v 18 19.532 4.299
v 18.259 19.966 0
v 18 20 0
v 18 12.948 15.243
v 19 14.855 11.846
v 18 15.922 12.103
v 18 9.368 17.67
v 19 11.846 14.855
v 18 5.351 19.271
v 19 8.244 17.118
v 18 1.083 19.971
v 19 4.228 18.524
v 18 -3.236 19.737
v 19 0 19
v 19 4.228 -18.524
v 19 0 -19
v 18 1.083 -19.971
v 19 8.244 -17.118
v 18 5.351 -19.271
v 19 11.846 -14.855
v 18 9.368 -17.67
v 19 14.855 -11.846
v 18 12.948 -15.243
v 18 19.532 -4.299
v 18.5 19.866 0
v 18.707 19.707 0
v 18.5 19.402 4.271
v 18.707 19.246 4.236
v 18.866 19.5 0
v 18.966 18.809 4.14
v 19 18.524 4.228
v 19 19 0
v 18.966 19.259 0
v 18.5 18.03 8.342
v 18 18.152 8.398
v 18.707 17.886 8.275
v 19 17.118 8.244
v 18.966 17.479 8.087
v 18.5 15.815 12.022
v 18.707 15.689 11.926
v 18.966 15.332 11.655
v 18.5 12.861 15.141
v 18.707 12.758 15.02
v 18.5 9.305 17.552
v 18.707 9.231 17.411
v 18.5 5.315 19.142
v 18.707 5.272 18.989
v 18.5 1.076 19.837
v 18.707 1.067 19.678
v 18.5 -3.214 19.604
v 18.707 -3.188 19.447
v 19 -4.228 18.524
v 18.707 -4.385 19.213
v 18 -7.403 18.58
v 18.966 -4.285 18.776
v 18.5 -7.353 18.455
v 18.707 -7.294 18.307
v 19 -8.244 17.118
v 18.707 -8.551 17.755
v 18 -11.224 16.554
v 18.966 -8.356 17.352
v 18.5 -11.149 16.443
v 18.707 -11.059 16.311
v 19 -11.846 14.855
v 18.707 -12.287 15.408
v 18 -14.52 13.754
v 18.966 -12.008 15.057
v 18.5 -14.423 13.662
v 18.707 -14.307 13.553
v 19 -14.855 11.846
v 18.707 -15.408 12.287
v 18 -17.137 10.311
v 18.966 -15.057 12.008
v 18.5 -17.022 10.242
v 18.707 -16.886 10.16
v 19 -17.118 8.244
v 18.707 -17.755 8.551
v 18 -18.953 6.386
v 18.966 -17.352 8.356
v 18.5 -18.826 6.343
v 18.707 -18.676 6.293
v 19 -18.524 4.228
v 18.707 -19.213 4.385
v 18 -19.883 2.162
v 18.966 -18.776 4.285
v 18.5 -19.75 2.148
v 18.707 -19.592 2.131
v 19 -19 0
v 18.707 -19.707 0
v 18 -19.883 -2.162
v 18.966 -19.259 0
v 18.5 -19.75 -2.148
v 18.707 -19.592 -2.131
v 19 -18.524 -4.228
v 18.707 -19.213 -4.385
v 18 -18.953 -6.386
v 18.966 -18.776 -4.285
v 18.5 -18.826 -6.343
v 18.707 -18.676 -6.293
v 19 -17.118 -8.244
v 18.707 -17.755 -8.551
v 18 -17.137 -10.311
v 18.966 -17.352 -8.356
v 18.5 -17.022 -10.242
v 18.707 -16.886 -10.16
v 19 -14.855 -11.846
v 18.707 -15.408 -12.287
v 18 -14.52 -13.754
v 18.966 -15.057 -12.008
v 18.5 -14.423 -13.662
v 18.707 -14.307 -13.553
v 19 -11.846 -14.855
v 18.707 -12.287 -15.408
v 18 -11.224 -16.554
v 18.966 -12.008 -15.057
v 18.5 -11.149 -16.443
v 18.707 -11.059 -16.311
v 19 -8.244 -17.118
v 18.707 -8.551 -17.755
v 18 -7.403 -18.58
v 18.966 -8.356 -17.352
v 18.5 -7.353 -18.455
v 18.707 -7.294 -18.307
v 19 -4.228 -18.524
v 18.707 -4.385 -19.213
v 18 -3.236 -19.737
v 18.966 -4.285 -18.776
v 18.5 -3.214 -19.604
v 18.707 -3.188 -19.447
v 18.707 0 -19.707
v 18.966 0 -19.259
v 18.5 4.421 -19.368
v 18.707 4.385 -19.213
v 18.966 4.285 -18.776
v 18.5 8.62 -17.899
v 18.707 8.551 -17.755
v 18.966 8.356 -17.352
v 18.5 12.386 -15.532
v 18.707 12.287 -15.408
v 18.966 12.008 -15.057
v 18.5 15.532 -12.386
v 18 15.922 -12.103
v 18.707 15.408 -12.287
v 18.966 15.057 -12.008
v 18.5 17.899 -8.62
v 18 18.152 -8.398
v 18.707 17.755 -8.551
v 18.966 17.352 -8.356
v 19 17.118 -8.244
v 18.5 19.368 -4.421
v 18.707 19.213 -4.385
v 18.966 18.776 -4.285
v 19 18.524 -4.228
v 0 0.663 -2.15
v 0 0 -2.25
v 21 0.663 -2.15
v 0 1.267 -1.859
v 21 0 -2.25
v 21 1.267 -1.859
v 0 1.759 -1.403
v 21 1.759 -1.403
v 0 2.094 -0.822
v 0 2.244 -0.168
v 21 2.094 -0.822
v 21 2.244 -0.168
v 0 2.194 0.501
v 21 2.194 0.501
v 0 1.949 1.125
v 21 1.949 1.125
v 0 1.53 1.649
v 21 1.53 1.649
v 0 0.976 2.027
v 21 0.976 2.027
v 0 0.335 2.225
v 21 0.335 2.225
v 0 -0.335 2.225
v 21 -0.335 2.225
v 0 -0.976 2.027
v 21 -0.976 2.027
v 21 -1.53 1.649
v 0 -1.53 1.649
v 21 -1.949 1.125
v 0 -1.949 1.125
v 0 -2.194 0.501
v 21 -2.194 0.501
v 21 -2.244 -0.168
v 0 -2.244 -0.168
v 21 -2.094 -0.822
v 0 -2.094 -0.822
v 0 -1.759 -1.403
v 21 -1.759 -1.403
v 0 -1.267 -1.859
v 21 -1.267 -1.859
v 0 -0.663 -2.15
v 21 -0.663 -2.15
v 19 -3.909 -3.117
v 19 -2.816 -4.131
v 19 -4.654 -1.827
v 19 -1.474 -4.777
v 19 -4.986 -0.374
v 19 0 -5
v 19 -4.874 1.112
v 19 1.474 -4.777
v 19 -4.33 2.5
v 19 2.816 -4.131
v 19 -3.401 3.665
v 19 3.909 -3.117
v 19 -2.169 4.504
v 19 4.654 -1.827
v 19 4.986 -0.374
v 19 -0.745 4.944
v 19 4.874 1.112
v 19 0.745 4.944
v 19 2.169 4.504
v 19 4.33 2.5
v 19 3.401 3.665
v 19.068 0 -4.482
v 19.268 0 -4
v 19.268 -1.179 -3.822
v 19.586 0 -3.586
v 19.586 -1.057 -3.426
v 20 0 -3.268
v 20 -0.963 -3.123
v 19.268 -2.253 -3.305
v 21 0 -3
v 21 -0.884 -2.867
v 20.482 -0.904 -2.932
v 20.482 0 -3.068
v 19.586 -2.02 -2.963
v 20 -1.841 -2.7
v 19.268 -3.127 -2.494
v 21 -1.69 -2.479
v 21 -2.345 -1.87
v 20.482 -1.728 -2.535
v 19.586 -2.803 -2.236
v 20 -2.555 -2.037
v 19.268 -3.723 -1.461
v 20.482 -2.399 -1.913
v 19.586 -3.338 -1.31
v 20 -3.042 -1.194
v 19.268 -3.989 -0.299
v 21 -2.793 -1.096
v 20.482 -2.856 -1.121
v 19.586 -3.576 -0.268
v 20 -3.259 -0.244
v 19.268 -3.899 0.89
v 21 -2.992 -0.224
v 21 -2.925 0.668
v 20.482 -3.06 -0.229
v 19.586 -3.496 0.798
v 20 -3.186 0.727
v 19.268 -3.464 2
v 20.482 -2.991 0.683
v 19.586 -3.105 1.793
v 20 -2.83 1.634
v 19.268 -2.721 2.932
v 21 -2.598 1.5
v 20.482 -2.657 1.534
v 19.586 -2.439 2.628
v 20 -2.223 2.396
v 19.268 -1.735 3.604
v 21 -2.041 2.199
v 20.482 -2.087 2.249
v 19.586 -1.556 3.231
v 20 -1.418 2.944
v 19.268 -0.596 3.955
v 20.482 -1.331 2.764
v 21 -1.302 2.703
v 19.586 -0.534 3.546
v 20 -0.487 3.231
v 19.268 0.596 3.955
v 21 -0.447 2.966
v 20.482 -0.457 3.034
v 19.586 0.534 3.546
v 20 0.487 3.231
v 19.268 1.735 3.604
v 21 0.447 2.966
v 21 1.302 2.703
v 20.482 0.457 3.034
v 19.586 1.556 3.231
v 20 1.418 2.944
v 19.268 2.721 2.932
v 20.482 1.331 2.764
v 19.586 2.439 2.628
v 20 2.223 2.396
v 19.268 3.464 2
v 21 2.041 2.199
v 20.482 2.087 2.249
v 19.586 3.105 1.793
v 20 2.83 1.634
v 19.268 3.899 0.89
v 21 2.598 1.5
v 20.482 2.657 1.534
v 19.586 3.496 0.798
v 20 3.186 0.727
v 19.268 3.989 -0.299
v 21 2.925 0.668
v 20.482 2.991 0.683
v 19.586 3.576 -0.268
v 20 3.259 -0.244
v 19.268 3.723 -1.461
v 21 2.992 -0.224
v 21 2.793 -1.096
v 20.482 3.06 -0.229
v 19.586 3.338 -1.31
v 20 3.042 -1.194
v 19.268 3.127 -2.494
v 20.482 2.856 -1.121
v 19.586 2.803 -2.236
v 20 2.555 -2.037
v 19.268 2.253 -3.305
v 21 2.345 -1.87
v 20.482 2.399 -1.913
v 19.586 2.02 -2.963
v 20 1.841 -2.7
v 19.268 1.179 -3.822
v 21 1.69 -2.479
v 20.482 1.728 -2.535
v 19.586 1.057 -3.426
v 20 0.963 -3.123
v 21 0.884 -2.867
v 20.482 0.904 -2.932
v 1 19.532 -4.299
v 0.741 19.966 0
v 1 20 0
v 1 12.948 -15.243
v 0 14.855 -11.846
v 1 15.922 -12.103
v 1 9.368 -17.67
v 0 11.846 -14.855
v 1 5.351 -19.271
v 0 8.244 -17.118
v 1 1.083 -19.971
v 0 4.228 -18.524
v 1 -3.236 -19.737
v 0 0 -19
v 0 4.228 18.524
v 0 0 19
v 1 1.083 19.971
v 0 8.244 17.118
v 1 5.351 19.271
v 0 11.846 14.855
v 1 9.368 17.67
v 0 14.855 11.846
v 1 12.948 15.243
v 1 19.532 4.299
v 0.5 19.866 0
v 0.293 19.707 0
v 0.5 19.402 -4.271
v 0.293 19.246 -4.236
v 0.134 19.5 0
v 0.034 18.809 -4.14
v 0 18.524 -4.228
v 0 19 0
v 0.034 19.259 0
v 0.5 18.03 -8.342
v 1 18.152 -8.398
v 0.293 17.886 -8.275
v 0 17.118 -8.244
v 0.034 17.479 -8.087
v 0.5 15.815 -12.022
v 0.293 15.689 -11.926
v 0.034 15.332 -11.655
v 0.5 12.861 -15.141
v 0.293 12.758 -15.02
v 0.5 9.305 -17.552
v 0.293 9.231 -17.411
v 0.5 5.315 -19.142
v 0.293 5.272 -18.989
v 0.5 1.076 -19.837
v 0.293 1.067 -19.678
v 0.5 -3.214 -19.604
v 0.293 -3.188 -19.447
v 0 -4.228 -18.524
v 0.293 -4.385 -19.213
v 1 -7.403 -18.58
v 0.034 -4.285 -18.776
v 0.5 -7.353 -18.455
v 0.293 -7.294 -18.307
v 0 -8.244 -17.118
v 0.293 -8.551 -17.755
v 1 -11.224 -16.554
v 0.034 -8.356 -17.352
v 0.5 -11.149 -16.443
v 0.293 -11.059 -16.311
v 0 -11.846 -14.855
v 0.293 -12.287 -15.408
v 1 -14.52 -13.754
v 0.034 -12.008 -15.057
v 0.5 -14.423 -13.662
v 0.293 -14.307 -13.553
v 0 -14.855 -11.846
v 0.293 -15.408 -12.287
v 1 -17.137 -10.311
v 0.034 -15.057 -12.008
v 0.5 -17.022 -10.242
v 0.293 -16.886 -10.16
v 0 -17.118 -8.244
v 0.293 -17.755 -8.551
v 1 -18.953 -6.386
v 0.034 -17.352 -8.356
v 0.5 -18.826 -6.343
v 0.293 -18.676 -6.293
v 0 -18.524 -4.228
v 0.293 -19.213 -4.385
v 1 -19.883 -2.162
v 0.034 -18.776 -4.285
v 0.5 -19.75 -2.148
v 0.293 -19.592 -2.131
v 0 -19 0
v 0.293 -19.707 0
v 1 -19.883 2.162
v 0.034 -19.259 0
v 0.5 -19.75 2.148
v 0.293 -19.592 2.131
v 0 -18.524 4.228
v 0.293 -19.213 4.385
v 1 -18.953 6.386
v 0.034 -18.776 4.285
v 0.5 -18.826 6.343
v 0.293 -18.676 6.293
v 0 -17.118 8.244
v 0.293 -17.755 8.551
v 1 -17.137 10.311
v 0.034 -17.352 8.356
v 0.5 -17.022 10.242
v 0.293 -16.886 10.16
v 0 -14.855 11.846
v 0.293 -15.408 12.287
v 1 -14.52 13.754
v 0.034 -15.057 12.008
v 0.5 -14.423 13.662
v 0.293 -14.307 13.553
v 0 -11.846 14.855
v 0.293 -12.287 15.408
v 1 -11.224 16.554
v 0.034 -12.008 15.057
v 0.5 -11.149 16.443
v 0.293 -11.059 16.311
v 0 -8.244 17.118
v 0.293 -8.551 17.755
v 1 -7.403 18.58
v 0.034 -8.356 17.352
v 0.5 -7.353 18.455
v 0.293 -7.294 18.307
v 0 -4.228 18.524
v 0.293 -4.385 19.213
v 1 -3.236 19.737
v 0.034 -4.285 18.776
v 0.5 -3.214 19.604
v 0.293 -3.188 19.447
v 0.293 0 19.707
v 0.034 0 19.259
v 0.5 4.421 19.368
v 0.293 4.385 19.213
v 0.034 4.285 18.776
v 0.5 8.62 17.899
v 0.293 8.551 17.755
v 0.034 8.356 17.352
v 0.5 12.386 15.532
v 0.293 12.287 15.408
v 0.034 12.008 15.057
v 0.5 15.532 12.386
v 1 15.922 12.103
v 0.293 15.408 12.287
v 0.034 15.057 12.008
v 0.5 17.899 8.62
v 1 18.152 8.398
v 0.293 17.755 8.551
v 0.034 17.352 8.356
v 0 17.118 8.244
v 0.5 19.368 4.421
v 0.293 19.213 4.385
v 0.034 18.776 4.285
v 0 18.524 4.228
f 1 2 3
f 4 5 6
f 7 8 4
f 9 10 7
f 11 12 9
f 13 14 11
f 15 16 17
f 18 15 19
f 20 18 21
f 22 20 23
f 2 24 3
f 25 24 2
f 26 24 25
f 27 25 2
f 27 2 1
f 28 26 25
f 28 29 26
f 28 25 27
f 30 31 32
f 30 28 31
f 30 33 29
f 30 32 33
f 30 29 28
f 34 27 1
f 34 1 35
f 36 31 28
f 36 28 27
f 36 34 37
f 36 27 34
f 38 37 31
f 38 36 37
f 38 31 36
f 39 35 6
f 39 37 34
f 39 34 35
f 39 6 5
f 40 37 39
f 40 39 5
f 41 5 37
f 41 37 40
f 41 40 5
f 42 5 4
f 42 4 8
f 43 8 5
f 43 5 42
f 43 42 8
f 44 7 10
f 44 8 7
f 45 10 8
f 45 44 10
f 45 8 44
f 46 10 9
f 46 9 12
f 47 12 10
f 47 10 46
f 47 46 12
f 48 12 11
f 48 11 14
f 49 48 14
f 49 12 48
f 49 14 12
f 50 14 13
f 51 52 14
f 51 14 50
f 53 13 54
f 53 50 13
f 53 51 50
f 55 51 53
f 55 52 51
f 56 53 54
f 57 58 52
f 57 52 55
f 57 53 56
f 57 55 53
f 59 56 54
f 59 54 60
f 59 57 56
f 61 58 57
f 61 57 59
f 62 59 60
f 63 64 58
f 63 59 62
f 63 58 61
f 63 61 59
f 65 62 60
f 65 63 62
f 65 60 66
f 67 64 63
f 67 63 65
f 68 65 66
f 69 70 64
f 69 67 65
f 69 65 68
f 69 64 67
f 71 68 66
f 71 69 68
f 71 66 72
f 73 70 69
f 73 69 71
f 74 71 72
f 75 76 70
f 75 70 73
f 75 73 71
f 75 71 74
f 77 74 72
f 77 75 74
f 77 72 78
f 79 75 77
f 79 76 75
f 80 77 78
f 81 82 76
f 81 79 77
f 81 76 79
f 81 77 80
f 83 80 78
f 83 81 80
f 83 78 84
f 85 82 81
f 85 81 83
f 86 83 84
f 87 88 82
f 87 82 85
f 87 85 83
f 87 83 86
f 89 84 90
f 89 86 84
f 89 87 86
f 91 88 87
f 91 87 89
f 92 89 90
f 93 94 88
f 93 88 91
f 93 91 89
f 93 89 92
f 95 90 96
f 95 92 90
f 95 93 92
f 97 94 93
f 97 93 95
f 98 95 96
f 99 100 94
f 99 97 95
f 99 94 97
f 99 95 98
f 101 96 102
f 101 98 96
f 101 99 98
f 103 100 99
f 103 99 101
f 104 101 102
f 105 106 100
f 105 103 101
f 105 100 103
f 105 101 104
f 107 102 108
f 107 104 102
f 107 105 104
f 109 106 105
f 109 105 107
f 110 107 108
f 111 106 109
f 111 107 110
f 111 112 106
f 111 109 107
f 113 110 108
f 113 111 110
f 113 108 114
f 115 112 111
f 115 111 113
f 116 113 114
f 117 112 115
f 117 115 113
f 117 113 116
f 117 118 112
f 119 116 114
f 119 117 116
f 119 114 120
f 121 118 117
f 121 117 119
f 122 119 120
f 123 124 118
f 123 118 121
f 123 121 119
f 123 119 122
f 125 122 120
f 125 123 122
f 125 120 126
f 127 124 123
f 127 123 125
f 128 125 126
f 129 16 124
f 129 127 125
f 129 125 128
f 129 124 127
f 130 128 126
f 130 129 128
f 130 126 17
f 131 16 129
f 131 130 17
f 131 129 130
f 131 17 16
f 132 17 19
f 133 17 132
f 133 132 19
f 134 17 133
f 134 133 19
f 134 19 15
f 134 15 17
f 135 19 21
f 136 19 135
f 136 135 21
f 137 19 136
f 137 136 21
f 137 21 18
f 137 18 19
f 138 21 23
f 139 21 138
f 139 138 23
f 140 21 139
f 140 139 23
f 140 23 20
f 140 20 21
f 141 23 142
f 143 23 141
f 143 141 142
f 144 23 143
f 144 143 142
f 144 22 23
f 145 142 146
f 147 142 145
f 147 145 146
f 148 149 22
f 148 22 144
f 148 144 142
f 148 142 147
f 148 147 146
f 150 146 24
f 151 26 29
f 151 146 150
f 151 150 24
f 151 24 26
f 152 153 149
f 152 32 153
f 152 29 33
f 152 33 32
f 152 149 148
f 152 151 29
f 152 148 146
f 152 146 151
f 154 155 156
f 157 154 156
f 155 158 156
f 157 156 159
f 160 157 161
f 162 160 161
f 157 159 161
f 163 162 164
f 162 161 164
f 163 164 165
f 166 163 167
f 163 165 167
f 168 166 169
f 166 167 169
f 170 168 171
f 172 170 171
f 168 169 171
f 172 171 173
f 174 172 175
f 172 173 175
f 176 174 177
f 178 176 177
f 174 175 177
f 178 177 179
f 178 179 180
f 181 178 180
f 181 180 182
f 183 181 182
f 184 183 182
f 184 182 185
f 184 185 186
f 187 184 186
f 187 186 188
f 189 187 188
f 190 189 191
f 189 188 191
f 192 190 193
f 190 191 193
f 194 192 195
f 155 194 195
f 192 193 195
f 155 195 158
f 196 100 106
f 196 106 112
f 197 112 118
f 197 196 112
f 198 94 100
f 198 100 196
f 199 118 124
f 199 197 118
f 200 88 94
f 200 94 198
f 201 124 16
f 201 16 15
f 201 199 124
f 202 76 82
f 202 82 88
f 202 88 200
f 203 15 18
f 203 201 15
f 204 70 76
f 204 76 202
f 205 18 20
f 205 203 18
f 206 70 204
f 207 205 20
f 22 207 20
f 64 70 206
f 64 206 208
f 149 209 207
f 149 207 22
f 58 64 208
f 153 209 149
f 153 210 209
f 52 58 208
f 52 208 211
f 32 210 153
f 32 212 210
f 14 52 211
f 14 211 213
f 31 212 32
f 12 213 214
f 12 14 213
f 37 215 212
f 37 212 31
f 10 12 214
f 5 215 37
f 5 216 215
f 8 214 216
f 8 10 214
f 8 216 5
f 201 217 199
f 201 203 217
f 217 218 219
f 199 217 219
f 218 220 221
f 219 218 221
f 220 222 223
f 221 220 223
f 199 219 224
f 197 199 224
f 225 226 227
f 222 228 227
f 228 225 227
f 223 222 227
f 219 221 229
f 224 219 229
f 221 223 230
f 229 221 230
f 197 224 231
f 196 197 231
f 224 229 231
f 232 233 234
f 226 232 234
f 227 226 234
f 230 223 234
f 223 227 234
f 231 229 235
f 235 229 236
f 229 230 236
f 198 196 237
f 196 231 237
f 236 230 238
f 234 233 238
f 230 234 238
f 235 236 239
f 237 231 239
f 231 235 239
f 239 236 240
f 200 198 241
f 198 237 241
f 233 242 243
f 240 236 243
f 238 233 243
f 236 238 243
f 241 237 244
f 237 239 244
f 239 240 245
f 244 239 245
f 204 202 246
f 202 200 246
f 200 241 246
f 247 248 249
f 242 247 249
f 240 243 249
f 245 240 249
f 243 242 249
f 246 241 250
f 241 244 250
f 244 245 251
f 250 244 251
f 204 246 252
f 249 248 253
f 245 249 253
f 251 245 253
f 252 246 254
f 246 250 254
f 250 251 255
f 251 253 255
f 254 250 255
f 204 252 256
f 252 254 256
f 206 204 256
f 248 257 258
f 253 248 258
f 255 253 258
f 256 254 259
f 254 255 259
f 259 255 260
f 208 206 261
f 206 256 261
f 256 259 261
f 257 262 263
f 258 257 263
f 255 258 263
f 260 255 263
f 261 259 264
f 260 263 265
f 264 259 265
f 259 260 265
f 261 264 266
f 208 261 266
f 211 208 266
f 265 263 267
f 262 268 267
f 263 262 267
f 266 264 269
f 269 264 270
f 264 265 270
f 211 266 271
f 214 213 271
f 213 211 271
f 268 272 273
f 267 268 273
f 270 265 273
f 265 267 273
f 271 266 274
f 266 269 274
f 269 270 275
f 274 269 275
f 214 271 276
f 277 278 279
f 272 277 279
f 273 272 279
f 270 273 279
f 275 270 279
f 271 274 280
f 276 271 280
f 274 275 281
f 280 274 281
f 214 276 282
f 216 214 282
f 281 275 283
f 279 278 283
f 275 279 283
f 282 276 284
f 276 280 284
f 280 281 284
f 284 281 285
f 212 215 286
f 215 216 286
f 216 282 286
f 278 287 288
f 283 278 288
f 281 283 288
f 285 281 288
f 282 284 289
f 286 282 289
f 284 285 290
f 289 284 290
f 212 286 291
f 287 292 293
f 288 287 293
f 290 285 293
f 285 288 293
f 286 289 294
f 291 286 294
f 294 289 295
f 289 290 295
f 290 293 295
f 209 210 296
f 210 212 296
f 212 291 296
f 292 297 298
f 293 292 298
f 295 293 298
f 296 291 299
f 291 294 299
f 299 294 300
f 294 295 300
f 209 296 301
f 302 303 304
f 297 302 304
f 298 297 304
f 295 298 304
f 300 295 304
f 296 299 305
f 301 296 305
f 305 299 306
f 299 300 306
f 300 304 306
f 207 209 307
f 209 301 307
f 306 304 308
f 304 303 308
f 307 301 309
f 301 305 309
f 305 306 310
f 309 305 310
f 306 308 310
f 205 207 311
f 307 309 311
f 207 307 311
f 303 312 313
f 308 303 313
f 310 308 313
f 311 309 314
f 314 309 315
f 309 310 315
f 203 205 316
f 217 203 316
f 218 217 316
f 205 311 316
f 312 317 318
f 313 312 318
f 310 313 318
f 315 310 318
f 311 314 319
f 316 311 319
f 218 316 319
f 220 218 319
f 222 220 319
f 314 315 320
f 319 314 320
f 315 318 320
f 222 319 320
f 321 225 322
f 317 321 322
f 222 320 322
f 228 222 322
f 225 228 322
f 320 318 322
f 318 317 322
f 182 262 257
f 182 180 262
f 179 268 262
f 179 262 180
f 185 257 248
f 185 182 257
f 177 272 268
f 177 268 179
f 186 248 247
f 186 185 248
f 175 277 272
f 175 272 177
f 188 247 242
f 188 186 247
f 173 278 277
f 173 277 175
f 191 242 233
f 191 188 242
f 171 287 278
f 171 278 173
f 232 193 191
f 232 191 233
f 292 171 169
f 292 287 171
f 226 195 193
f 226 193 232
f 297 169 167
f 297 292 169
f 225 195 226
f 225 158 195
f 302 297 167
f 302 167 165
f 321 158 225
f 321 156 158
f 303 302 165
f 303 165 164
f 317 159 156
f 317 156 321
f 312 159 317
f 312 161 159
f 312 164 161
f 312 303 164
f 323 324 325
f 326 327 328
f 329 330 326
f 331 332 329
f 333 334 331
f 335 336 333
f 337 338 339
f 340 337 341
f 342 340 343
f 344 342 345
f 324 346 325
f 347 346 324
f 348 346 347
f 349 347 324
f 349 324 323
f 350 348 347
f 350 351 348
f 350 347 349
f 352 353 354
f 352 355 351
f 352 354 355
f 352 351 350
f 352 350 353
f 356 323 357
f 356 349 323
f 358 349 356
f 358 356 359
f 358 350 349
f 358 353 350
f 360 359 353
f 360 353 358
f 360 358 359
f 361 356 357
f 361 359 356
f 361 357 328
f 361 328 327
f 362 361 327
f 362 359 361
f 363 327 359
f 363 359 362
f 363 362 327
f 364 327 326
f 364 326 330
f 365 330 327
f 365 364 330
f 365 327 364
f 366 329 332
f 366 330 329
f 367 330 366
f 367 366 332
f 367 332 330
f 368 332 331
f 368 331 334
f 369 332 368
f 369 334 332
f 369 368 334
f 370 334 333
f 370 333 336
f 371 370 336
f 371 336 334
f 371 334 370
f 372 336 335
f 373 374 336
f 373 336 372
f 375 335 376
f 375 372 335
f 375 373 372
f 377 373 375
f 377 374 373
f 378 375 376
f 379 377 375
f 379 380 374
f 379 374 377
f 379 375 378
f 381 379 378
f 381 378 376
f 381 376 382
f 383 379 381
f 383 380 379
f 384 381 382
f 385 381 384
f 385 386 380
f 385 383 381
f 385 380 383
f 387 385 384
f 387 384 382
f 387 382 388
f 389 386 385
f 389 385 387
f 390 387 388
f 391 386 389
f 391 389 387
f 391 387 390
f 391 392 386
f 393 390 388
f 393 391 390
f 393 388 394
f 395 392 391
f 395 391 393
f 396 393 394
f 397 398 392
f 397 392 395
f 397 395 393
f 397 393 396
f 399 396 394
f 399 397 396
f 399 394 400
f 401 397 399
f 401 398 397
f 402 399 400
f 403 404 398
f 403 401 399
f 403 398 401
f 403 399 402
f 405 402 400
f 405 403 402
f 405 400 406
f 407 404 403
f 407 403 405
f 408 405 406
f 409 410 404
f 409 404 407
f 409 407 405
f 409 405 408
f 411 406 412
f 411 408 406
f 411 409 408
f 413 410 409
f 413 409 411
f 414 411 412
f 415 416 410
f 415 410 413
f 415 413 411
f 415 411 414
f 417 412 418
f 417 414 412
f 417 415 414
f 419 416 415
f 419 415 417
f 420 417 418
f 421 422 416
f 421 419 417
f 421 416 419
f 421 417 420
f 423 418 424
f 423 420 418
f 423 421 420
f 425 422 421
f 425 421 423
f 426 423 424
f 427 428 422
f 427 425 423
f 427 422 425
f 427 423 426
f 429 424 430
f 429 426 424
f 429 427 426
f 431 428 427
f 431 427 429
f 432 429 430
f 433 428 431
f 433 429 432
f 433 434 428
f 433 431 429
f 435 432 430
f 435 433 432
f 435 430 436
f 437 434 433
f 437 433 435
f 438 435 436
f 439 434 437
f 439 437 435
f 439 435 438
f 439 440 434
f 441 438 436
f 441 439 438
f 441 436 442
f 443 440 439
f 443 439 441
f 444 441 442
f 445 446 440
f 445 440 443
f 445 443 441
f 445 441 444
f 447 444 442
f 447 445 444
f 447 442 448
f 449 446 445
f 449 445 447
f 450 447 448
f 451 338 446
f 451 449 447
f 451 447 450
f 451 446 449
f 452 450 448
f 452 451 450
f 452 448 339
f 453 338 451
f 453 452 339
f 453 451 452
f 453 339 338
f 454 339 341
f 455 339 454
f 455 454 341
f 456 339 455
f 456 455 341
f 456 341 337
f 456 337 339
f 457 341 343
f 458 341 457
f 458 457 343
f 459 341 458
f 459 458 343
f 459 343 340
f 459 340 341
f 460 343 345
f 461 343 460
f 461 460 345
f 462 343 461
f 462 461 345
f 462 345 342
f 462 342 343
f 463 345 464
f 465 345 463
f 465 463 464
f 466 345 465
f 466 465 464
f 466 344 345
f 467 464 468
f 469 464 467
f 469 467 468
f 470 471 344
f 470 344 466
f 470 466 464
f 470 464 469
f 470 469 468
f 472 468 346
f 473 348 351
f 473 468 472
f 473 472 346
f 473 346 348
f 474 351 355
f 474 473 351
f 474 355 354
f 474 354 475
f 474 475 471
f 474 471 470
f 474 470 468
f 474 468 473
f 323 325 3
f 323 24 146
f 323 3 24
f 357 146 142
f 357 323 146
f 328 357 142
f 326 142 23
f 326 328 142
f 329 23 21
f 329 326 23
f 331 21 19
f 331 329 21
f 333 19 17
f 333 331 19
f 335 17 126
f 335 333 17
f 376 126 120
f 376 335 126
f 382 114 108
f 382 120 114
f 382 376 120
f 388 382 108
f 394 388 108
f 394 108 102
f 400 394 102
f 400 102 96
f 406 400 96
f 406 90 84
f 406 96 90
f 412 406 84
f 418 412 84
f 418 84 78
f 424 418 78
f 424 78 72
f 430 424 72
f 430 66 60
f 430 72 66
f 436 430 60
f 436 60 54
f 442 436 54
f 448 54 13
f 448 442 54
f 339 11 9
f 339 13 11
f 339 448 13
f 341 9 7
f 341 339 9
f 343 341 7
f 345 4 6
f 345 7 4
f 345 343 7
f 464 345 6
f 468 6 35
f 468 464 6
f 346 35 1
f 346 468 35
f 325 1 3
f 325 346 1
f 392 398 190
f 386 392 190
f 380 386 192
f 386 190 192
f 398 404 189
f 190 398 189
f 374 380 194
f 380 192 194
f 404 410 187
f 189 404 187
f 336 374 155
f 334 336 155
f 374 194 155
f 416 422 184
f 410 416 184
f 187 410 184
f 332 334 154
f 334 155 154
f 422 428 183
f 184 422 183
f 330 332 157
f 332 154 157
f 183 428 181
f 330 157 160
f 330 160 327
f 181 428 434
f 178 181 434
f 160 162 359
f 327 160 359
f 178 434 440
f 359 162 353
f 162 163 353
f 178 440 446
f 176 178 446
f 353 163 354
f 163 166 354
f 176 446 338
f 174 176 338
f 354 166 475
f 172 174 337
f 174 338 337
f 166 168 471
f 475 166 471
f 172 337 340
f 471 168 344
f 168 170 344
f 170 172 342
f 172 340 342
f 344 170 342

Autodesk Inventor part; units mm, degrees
ref_plane "YZ Plane" through (0, 0, 0) normal (1, 0, 0) x (0, 1, 0)
ref_plane "XZ Plane" through (0, 0, 0) normal (0, 1, 0) x (-1, 0, 0)
ref_plane "XY Plane" through (0, 0, 0) normal (0, 0, 1) x (1, 0, 0)
sketch "Эскиз1" plane through (0, 0, 0) normal (1, 0, 0) x (0, 1, 0)
  circle A0 centre (0, 0) radius 20
  dimension "d0" = 40
extrude "Выдавливание1" add sketch "Эскиз1" along normal blind 19
sketch "Эскиз2" plane through (19, 0, 0) normal (1, 0, 0) x (0, 0, -1)
  circle A0 centre (0, 0) radius 3
  dimension "d3" = 6
extrude "Выдавливание2" add sketch "Эскиз2" along normal blind 2
sketch "Эскиз3" plane through (21, 0, 0) normal (1, 0, 0) x (0, 0, -1)
  circle A0 centre (0, 0) radius 2.25
  dimension "d6" = 4.5
extrude "Выдавливание3" cut sketch "Эскиз3" against normal blind 100
fillet "Сопряжение1" radius 1 2 edges at (0, -20, 0) (19, -20, 0)
fillet "Сопряжение2" radius 2 1 edges at (19, 0, 3)
properties part number "каток"
